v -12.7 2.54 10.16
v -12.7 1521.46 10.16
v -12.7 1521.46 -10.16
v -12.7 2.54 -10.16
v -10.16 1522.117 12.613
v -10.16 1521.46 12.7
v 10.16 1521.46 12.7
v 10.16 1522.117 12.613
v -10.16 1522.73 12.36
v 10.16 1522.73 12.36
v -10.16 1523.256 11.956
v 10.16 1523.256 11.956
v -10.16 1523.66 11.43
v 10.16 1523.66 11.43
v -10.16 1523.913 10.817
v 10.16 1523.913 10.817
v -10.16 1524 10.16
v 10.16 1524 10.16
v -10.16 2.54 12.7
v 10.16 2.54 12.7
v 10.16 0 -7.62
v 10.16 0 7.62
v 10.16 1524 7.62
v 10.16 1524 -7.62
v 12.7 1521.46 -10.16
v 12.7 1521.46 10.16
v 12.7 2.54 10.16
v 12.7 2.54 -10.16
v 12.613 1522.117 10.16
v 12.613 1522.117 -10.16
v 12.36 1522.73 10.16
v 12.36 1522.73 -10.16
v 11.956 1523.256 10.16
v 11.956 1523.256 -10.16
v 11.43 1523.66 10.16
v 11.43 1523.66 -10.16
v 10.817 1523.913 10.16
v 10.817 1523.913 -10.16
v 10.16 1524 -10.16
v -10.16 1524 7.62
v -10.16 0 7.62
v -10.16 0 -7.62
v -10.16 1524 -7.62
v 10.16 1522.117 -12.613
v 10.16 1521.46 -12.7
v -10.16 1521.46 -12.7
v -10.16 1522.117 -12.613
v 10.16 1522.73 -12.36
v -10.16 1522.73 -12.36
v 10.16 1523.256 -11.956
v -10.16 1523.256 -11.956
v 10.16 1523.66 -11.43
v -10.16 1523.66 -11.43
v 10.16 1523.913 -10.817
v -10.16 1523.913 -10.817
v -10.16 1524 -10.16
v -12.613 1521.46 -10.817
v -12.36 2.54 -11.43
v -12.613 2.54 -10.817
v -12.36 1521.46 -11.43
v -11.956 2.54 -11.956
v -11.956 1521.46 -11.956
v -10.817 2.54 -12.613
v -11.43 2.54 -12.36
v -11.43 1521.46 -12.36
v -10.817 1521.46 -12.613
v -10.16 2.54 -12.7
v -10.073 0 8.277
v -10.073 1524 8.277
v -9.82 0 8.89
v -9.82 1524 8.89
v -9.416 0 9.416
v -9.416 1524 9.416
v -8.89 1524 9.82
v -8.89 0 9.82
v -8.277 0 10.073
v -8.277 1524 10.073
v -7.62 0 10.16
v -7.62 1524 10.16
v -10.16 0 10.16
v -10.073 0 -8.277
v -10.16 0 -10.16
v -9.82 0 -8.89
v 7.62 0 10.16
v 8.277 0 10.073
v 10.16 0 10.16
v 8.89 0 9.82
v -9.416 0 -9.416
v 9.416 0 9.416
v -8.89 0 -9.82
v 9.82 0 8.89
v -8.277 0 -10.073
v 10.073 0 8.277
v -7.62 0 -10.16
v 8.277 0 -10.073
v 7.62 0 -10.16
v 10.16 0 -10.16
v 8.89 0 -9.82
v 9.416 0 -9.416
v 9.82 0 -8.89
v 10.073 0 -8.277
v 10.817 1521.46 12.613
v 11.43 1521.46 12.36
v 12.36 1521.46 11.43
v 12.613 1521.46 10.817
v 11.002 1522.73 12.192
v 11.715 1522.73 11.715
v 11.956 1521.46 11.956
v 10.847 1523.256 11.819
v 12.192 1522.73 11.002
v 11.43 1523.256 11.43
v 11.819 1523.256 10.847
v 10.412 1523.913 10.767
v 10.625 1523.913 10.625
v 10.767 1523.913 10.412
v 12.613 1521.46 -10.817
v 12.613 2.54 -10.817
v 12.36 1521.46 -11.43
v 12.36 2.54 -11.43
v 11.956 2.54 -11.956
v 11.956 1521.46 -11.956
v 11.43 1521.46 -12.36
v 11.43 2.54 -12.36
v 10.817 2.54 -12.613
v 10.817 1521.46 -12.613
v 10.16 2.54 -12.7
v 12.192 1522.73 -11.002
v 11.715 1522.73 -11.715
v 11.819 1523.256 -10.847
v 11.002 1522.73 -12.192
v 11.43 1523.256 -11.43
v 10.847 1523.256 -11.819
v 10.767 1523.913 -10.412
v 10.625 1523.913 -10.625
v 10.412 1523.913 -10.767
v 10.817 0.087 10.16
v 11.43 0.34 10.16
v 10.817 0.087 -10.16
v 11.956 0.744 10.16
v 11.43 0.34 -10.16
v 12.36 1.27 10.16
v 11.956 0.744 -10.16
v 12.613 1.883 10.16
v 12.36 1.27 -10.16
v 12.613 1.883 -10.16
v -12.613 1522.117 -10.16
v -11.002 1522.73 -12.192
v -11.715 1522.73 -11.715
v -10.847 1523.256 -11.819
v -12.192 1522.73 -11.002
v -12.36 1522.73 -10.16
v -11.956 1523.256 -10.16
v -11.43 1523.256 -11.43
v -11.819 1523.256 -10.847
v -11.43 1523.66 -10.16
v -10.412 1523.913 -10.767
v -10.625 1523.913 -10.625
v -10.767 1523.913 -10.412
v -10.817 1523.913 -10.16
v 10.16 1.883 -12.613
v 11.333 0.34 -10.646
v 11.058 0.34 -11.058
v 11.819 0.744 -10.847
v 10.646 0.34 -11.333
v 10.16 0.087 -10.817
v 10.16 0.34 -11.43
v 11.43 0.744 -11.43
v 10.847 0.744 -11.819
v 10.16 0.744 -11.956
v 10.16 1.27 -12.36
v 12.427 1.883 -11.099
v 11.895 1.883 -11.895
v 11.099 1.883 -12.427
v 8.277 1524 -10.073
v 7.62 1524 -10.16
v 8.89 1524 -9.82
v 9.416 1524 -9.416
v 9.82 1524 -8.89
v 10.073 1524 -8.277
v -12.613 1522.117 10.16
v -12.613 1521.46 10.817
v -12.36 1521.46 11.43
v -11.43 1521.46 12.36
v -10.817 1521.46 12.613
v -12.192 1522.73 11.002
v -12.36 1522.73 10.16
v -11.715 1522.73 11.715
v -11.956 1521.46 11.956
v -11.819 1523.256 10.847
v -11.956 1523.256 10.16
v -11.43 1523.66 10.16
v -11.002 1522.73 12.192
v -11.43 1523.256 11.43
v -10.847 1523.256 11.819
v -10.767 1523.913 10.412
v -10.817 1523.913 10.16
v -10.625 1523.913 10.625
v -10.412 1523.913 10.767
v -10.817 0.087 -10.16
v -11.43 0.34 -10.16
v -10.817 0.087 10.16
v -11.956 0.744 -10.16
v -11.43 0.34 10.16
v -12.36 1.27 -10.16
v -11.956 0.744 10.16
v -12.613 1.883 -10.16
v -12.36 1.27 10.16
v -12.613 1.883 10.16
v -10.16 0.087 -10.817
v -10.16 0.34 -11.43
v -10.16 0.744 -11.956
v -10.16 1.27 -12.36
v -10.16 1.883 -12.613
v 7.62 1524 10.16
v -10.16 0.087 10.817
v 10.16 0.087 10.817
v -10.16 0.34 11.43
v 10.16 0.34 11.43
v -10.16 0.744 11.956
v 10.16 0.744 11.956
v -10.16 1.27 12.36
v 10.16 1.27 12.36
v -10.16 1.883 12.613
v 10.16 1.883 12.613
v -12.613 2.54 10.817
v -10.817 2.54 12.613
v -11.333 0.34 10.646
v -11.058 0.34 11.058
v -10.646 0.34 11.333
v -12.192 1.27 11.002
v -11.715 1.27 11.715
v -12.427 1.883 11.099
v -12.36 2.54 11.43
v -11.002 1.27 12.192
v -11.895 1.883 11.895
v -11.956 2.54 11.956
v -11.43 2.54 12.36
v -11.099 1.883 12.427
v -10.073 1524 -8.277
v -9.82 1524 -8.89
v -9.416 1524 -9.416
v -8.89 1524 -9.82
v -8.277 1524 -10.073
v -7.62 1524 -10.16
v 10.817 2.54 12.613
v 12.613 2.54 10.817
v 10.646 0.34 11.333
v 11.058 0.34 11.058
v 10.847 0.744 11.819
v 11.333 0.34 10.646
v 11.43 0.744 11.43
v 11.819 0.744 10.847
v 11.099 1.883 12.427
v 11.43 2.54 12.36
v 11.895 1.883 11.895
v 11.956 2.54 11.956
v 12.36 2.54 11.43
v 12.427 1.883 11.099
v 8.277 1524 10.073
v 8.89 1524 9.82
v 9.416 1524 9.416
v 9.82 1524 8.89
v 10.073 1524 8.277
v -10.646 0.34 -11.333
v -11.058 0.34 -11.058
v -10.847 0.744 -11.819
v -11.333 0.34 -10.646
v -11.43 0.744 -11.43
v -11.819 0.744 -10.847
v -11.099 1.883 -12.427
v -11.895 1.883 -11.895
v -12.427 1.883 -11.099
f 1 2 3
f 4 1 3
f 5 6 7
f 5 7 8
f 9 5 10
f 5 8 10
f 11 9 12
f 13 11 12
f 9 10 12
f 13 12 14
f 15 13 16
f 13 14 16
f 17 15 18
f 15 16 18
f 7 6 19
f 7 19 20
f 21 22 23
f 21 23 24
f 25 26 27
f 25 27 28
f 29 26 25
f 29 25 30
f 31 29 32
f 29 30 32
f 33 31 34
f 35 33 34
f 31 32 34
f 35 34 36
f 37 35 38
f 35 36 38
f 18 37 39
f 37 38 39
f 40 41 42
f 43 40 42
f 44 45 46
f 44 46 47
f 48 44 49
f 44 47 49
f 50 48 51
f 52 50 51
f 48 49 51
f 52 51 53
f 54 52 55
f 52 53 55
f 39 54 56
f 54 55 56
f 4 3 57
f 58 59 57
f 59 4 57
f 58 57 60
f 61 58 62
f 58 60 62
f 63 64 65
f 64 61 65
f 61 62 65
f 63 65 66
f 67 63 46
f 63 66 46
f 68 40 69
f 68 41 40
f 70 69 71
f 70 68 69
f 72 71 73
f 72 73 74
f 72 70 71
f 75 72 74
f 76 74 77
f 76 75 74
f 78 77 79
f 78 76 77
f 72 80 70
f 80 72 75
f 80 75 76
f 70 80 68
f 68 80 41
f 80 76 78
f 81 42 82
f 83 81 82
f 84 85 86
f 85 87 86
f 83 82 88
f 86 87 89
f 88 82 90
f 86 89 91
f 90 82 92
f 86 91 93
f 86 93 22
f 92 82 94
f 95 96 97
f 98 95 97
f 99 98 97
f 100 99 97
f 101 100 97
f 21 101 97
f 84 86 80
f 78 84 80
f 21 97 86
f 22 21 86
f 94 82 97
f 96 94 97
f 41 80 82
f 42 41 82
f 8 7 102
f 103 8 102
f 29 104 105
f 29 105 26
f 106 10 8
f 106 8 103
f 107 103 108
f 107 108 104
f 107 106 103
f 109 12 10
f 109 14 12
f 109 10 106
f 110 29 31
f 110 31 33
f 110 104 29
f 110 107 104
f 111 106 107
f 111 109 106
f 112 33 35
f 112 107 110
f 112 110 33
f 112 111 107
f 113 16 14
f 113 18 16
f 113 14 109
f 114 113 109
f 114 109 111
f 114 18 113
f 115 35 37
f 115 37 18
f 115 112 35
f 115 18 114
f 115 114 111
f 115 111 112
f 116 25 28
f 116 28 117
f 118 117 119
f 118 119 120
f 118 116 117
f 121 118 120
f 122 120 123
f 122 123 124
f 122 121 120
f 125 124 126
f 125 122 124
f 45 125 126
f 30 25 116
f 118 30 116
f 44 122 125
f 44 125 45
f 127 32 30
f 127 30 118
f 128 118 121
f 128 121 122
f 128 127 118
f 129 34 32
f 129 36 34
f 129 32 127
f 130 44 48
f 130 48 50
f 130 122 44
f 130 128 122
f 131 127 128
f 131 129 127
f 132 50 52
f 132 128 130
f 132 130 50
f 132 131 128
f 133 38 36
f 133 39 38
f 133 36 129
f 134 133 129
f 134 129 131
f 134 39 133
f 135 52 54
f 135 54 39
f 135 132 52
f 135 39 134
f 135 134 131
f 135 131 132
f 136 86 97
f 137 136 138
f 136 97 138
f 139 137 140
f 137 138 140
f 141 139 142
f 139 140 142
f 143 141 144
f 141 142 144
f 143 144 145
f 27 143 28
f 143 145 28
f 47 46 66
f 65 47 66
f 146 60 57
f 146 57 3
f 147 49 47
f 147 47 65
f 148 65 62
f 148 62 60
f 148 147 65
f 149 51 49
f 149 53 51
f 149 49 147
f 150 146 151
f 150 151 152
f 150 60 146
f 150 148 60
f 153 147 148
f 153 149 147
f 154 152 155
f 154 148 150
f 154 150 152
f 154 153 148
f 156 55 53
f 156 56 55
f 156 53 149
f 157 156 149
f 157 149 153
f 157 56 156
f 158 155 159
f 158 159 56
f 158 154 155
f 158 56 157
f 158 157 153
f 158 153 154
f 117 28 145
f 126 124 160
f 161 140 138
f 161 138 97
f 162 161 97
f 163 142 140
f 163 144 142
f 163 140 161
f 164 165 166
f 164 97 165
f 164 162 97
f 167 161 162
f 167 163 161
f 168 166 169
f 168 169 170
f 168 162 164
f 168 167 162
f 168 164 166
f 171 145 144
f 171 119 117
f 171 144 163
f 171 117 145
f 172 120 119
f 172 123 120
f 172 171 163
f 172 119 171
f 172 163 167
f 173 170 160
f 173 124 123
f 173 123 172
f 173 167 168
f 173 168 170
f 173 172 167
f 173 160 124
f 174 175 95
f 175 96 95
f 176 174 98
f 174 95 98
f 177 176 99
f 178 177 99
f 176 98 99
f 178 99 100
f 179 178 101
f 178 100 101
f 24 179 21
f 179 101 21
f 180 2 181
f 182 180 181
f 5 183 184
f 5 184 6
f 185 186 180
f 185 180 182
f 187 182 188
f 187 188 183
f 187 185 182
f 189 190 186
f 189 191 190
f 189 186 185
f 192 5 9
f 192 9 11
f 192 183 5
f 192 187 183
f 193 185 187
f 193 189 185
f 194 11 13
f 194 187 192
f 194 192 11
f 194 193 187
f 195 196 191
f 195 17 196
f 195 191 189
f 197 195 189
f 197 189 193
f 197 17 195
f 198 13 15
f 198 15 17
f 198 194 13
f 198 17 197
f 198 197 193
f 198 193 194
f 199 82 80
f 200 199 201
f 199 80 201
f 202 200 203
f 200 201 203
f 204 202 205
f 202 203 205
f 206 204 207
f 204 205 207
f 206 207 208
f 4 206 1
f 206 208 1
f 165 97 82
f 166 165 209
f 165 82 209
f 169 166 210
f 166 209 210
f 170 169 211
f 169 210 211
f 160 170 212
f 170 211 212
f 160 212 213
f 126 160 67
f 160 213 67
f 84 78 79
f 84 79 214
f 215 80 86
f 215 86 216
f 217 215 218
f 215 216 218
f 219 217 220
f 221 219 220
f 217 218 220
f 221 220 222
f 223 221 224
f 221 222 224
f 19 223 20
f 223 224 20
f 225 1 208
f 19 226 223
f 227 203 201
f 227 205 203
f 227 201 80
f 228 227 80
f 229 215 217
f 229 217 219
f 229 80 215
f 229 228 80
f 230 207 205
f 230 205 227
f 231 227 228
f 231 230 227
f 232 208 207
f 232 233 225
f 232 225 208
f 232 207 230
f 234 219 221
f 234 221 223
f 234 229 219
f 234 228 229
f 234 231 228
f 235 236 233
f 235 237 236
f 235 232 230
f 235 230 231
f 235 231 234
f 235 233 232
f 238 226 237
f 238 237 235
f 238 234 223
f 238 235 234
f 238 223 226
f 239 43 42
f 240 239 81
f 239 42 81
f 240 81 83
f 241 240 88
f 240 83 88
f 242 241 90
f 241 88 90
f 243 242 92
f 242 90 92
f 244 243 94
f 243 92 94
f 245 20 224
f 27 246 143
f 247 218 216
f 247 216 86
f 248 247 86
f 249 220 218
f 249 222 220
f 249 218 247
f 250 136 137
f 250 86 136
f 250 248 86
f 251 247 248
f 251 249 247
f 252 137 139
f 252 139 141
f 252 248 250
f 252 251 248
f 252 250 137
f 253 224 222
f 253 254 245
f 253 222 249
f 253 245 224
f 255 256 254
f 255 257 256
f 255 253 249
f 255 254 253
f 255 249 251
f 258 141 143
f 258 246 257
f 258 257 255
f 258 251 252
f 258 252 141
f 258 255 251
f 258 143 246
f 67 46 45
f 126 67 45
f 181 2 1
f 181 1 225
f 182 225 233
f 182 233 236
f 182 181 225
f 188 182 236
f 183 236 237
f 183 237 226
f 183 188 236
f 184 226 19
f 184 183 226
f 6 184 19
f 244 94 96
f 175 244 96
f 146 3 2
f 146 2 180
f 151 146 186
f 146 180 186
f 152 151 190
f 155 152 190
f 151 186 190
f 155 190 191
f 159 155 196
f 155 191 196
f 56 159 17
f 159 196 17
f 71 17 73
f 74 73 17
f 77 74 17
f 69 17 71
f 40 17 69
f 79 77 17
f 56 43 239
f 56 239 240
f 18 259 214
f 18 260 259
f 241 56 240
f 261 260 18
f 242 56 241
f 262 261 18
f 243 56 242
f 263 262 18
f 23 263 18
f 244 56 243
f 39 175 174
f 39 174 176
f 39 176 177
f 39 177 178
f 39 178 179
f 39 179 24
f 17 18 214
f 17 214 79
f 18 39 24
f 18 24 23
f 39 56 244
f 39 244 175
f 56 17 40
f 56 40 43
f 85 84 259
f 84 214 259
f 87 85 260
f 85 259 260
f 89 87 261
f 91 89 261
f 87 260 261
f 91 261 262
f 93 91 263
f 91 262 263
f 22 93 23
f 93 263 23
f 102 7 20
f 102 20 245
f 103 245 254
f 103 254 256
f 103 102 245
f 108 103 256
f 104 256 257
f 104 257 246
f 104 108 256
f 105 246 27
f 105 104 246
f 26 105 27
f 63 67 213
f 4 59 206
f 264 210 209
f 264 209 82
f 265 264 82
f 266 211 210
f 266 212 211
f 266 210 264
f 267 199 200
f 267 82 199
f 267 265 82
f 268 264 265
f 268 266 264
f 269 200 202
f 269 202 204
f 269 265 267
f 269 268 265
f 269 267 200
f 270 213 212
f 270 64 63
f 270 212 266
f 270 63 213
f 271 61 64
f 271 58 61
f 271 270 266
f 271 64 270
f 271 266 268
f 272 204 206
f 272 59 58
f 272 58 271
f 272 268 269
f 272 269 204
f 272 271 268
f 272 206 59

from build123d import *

# Parameters (mm, degrees)
SKETCH4_W           = 25.4
SKETCH4_H           = 25.4
BOSS_EXTRUDE6_DEPTH = 1524
SHELL1_T            = -2.54
FILLET1_R           = 2.54
FILLET2_R           = 2.54
FILLET3_R           = 2.54
FILLET5_R           = 2.54
FILLET6_R           = 2.54


with BuildPart() as part:
    # Sketch4 → Boss-Extrude6 (new body)
    with BuildSketch(Plane(origin=(0, 0, 0), x_dir=(1, 0, 0), z_dir=(0, 1, 0))):
        Rectangle(SKETCH4_W, SKETCH4_H)
    extrude(amount=BOSS_EXTRUDE6_DEPTH)

    # Shell1
    shell1_openings = [part.faces().sort_by_distance(p)[0] for p in [
        (0, 1524, 0),
        (0, 0, 0),
    ]]
    offset(amount=SHELL1_T, openings=shell1_openings, kind=Kind.INTERSECTION)

    # Fillet1
    fillet1_edges = [part.edges().sort_by_distance(p)[0] for p in [
        (12.7, 762, -12.7),
        (12.7, 762, 12.7),
        (-12.7, 762, 12.7),
        (-12.7, 762, -12.7),
    ]]
    fillet(fillet1_edges, radius=FILLET1_R)

    # Fillet2
    fillet2_edges = [part.edges().sort_by_distance(p)[0] for p in [
        (-10.16, 762, -10.16),
    ]]
    fillet(fillet2_edges, radius=FILLET2_R)

    # Fillet3
    fillet3_edges = [part.edges().sort_by_distance(p)[0] for p in [
        (10.16, 762, -10.16),
        (-10.16, 762, 10.16),
        (10.16, 762, 10.16),
    ]]
    fillet(fillet3_edges, radius=FILLET3_R)

    # Fillet5
    fillet5_edges = [part.edges().sort_by_distance(p)[0] for p in [
        (0, 1524, 12.7),
        (-12.7, 1524, 0),
        (0, 1524, -12.7),
        (12.7, 1524, 0),
        (-11.956051224, 1524, -11.956051224),
        (11.956051224, 1524, -11.956051224),
        (11.956051224, 1524, 11.956051224),
        (-11.956051224, 1524, 11.956051224),
    ]]
    fillet(fillet5_edges, radius=FILLET5_R - 0.0001)  # a hair under: the kernel refuses the full size

    # Fillet6
    fillet6_edges = [part.edges().sort_by_distance(p)[0] for p in [
        (0, 0, 12.7),
        (0, 0, -12.7),
        (12.7, 0, 0),
        (-12.7, 0, 0),
        (-11.956051224, 0, -11.956051224),
        (11.956051224, 0, -11.956051224),
        (11.956051224, 0, 11.956051224),
        (-11.956051224, 0, 11.956051224),
    ]]
    fillet(fillet6_edges, radius=FILLET6_R - 0.0001)  # a hair under: the kernel refuses the full size


solid = part.part
